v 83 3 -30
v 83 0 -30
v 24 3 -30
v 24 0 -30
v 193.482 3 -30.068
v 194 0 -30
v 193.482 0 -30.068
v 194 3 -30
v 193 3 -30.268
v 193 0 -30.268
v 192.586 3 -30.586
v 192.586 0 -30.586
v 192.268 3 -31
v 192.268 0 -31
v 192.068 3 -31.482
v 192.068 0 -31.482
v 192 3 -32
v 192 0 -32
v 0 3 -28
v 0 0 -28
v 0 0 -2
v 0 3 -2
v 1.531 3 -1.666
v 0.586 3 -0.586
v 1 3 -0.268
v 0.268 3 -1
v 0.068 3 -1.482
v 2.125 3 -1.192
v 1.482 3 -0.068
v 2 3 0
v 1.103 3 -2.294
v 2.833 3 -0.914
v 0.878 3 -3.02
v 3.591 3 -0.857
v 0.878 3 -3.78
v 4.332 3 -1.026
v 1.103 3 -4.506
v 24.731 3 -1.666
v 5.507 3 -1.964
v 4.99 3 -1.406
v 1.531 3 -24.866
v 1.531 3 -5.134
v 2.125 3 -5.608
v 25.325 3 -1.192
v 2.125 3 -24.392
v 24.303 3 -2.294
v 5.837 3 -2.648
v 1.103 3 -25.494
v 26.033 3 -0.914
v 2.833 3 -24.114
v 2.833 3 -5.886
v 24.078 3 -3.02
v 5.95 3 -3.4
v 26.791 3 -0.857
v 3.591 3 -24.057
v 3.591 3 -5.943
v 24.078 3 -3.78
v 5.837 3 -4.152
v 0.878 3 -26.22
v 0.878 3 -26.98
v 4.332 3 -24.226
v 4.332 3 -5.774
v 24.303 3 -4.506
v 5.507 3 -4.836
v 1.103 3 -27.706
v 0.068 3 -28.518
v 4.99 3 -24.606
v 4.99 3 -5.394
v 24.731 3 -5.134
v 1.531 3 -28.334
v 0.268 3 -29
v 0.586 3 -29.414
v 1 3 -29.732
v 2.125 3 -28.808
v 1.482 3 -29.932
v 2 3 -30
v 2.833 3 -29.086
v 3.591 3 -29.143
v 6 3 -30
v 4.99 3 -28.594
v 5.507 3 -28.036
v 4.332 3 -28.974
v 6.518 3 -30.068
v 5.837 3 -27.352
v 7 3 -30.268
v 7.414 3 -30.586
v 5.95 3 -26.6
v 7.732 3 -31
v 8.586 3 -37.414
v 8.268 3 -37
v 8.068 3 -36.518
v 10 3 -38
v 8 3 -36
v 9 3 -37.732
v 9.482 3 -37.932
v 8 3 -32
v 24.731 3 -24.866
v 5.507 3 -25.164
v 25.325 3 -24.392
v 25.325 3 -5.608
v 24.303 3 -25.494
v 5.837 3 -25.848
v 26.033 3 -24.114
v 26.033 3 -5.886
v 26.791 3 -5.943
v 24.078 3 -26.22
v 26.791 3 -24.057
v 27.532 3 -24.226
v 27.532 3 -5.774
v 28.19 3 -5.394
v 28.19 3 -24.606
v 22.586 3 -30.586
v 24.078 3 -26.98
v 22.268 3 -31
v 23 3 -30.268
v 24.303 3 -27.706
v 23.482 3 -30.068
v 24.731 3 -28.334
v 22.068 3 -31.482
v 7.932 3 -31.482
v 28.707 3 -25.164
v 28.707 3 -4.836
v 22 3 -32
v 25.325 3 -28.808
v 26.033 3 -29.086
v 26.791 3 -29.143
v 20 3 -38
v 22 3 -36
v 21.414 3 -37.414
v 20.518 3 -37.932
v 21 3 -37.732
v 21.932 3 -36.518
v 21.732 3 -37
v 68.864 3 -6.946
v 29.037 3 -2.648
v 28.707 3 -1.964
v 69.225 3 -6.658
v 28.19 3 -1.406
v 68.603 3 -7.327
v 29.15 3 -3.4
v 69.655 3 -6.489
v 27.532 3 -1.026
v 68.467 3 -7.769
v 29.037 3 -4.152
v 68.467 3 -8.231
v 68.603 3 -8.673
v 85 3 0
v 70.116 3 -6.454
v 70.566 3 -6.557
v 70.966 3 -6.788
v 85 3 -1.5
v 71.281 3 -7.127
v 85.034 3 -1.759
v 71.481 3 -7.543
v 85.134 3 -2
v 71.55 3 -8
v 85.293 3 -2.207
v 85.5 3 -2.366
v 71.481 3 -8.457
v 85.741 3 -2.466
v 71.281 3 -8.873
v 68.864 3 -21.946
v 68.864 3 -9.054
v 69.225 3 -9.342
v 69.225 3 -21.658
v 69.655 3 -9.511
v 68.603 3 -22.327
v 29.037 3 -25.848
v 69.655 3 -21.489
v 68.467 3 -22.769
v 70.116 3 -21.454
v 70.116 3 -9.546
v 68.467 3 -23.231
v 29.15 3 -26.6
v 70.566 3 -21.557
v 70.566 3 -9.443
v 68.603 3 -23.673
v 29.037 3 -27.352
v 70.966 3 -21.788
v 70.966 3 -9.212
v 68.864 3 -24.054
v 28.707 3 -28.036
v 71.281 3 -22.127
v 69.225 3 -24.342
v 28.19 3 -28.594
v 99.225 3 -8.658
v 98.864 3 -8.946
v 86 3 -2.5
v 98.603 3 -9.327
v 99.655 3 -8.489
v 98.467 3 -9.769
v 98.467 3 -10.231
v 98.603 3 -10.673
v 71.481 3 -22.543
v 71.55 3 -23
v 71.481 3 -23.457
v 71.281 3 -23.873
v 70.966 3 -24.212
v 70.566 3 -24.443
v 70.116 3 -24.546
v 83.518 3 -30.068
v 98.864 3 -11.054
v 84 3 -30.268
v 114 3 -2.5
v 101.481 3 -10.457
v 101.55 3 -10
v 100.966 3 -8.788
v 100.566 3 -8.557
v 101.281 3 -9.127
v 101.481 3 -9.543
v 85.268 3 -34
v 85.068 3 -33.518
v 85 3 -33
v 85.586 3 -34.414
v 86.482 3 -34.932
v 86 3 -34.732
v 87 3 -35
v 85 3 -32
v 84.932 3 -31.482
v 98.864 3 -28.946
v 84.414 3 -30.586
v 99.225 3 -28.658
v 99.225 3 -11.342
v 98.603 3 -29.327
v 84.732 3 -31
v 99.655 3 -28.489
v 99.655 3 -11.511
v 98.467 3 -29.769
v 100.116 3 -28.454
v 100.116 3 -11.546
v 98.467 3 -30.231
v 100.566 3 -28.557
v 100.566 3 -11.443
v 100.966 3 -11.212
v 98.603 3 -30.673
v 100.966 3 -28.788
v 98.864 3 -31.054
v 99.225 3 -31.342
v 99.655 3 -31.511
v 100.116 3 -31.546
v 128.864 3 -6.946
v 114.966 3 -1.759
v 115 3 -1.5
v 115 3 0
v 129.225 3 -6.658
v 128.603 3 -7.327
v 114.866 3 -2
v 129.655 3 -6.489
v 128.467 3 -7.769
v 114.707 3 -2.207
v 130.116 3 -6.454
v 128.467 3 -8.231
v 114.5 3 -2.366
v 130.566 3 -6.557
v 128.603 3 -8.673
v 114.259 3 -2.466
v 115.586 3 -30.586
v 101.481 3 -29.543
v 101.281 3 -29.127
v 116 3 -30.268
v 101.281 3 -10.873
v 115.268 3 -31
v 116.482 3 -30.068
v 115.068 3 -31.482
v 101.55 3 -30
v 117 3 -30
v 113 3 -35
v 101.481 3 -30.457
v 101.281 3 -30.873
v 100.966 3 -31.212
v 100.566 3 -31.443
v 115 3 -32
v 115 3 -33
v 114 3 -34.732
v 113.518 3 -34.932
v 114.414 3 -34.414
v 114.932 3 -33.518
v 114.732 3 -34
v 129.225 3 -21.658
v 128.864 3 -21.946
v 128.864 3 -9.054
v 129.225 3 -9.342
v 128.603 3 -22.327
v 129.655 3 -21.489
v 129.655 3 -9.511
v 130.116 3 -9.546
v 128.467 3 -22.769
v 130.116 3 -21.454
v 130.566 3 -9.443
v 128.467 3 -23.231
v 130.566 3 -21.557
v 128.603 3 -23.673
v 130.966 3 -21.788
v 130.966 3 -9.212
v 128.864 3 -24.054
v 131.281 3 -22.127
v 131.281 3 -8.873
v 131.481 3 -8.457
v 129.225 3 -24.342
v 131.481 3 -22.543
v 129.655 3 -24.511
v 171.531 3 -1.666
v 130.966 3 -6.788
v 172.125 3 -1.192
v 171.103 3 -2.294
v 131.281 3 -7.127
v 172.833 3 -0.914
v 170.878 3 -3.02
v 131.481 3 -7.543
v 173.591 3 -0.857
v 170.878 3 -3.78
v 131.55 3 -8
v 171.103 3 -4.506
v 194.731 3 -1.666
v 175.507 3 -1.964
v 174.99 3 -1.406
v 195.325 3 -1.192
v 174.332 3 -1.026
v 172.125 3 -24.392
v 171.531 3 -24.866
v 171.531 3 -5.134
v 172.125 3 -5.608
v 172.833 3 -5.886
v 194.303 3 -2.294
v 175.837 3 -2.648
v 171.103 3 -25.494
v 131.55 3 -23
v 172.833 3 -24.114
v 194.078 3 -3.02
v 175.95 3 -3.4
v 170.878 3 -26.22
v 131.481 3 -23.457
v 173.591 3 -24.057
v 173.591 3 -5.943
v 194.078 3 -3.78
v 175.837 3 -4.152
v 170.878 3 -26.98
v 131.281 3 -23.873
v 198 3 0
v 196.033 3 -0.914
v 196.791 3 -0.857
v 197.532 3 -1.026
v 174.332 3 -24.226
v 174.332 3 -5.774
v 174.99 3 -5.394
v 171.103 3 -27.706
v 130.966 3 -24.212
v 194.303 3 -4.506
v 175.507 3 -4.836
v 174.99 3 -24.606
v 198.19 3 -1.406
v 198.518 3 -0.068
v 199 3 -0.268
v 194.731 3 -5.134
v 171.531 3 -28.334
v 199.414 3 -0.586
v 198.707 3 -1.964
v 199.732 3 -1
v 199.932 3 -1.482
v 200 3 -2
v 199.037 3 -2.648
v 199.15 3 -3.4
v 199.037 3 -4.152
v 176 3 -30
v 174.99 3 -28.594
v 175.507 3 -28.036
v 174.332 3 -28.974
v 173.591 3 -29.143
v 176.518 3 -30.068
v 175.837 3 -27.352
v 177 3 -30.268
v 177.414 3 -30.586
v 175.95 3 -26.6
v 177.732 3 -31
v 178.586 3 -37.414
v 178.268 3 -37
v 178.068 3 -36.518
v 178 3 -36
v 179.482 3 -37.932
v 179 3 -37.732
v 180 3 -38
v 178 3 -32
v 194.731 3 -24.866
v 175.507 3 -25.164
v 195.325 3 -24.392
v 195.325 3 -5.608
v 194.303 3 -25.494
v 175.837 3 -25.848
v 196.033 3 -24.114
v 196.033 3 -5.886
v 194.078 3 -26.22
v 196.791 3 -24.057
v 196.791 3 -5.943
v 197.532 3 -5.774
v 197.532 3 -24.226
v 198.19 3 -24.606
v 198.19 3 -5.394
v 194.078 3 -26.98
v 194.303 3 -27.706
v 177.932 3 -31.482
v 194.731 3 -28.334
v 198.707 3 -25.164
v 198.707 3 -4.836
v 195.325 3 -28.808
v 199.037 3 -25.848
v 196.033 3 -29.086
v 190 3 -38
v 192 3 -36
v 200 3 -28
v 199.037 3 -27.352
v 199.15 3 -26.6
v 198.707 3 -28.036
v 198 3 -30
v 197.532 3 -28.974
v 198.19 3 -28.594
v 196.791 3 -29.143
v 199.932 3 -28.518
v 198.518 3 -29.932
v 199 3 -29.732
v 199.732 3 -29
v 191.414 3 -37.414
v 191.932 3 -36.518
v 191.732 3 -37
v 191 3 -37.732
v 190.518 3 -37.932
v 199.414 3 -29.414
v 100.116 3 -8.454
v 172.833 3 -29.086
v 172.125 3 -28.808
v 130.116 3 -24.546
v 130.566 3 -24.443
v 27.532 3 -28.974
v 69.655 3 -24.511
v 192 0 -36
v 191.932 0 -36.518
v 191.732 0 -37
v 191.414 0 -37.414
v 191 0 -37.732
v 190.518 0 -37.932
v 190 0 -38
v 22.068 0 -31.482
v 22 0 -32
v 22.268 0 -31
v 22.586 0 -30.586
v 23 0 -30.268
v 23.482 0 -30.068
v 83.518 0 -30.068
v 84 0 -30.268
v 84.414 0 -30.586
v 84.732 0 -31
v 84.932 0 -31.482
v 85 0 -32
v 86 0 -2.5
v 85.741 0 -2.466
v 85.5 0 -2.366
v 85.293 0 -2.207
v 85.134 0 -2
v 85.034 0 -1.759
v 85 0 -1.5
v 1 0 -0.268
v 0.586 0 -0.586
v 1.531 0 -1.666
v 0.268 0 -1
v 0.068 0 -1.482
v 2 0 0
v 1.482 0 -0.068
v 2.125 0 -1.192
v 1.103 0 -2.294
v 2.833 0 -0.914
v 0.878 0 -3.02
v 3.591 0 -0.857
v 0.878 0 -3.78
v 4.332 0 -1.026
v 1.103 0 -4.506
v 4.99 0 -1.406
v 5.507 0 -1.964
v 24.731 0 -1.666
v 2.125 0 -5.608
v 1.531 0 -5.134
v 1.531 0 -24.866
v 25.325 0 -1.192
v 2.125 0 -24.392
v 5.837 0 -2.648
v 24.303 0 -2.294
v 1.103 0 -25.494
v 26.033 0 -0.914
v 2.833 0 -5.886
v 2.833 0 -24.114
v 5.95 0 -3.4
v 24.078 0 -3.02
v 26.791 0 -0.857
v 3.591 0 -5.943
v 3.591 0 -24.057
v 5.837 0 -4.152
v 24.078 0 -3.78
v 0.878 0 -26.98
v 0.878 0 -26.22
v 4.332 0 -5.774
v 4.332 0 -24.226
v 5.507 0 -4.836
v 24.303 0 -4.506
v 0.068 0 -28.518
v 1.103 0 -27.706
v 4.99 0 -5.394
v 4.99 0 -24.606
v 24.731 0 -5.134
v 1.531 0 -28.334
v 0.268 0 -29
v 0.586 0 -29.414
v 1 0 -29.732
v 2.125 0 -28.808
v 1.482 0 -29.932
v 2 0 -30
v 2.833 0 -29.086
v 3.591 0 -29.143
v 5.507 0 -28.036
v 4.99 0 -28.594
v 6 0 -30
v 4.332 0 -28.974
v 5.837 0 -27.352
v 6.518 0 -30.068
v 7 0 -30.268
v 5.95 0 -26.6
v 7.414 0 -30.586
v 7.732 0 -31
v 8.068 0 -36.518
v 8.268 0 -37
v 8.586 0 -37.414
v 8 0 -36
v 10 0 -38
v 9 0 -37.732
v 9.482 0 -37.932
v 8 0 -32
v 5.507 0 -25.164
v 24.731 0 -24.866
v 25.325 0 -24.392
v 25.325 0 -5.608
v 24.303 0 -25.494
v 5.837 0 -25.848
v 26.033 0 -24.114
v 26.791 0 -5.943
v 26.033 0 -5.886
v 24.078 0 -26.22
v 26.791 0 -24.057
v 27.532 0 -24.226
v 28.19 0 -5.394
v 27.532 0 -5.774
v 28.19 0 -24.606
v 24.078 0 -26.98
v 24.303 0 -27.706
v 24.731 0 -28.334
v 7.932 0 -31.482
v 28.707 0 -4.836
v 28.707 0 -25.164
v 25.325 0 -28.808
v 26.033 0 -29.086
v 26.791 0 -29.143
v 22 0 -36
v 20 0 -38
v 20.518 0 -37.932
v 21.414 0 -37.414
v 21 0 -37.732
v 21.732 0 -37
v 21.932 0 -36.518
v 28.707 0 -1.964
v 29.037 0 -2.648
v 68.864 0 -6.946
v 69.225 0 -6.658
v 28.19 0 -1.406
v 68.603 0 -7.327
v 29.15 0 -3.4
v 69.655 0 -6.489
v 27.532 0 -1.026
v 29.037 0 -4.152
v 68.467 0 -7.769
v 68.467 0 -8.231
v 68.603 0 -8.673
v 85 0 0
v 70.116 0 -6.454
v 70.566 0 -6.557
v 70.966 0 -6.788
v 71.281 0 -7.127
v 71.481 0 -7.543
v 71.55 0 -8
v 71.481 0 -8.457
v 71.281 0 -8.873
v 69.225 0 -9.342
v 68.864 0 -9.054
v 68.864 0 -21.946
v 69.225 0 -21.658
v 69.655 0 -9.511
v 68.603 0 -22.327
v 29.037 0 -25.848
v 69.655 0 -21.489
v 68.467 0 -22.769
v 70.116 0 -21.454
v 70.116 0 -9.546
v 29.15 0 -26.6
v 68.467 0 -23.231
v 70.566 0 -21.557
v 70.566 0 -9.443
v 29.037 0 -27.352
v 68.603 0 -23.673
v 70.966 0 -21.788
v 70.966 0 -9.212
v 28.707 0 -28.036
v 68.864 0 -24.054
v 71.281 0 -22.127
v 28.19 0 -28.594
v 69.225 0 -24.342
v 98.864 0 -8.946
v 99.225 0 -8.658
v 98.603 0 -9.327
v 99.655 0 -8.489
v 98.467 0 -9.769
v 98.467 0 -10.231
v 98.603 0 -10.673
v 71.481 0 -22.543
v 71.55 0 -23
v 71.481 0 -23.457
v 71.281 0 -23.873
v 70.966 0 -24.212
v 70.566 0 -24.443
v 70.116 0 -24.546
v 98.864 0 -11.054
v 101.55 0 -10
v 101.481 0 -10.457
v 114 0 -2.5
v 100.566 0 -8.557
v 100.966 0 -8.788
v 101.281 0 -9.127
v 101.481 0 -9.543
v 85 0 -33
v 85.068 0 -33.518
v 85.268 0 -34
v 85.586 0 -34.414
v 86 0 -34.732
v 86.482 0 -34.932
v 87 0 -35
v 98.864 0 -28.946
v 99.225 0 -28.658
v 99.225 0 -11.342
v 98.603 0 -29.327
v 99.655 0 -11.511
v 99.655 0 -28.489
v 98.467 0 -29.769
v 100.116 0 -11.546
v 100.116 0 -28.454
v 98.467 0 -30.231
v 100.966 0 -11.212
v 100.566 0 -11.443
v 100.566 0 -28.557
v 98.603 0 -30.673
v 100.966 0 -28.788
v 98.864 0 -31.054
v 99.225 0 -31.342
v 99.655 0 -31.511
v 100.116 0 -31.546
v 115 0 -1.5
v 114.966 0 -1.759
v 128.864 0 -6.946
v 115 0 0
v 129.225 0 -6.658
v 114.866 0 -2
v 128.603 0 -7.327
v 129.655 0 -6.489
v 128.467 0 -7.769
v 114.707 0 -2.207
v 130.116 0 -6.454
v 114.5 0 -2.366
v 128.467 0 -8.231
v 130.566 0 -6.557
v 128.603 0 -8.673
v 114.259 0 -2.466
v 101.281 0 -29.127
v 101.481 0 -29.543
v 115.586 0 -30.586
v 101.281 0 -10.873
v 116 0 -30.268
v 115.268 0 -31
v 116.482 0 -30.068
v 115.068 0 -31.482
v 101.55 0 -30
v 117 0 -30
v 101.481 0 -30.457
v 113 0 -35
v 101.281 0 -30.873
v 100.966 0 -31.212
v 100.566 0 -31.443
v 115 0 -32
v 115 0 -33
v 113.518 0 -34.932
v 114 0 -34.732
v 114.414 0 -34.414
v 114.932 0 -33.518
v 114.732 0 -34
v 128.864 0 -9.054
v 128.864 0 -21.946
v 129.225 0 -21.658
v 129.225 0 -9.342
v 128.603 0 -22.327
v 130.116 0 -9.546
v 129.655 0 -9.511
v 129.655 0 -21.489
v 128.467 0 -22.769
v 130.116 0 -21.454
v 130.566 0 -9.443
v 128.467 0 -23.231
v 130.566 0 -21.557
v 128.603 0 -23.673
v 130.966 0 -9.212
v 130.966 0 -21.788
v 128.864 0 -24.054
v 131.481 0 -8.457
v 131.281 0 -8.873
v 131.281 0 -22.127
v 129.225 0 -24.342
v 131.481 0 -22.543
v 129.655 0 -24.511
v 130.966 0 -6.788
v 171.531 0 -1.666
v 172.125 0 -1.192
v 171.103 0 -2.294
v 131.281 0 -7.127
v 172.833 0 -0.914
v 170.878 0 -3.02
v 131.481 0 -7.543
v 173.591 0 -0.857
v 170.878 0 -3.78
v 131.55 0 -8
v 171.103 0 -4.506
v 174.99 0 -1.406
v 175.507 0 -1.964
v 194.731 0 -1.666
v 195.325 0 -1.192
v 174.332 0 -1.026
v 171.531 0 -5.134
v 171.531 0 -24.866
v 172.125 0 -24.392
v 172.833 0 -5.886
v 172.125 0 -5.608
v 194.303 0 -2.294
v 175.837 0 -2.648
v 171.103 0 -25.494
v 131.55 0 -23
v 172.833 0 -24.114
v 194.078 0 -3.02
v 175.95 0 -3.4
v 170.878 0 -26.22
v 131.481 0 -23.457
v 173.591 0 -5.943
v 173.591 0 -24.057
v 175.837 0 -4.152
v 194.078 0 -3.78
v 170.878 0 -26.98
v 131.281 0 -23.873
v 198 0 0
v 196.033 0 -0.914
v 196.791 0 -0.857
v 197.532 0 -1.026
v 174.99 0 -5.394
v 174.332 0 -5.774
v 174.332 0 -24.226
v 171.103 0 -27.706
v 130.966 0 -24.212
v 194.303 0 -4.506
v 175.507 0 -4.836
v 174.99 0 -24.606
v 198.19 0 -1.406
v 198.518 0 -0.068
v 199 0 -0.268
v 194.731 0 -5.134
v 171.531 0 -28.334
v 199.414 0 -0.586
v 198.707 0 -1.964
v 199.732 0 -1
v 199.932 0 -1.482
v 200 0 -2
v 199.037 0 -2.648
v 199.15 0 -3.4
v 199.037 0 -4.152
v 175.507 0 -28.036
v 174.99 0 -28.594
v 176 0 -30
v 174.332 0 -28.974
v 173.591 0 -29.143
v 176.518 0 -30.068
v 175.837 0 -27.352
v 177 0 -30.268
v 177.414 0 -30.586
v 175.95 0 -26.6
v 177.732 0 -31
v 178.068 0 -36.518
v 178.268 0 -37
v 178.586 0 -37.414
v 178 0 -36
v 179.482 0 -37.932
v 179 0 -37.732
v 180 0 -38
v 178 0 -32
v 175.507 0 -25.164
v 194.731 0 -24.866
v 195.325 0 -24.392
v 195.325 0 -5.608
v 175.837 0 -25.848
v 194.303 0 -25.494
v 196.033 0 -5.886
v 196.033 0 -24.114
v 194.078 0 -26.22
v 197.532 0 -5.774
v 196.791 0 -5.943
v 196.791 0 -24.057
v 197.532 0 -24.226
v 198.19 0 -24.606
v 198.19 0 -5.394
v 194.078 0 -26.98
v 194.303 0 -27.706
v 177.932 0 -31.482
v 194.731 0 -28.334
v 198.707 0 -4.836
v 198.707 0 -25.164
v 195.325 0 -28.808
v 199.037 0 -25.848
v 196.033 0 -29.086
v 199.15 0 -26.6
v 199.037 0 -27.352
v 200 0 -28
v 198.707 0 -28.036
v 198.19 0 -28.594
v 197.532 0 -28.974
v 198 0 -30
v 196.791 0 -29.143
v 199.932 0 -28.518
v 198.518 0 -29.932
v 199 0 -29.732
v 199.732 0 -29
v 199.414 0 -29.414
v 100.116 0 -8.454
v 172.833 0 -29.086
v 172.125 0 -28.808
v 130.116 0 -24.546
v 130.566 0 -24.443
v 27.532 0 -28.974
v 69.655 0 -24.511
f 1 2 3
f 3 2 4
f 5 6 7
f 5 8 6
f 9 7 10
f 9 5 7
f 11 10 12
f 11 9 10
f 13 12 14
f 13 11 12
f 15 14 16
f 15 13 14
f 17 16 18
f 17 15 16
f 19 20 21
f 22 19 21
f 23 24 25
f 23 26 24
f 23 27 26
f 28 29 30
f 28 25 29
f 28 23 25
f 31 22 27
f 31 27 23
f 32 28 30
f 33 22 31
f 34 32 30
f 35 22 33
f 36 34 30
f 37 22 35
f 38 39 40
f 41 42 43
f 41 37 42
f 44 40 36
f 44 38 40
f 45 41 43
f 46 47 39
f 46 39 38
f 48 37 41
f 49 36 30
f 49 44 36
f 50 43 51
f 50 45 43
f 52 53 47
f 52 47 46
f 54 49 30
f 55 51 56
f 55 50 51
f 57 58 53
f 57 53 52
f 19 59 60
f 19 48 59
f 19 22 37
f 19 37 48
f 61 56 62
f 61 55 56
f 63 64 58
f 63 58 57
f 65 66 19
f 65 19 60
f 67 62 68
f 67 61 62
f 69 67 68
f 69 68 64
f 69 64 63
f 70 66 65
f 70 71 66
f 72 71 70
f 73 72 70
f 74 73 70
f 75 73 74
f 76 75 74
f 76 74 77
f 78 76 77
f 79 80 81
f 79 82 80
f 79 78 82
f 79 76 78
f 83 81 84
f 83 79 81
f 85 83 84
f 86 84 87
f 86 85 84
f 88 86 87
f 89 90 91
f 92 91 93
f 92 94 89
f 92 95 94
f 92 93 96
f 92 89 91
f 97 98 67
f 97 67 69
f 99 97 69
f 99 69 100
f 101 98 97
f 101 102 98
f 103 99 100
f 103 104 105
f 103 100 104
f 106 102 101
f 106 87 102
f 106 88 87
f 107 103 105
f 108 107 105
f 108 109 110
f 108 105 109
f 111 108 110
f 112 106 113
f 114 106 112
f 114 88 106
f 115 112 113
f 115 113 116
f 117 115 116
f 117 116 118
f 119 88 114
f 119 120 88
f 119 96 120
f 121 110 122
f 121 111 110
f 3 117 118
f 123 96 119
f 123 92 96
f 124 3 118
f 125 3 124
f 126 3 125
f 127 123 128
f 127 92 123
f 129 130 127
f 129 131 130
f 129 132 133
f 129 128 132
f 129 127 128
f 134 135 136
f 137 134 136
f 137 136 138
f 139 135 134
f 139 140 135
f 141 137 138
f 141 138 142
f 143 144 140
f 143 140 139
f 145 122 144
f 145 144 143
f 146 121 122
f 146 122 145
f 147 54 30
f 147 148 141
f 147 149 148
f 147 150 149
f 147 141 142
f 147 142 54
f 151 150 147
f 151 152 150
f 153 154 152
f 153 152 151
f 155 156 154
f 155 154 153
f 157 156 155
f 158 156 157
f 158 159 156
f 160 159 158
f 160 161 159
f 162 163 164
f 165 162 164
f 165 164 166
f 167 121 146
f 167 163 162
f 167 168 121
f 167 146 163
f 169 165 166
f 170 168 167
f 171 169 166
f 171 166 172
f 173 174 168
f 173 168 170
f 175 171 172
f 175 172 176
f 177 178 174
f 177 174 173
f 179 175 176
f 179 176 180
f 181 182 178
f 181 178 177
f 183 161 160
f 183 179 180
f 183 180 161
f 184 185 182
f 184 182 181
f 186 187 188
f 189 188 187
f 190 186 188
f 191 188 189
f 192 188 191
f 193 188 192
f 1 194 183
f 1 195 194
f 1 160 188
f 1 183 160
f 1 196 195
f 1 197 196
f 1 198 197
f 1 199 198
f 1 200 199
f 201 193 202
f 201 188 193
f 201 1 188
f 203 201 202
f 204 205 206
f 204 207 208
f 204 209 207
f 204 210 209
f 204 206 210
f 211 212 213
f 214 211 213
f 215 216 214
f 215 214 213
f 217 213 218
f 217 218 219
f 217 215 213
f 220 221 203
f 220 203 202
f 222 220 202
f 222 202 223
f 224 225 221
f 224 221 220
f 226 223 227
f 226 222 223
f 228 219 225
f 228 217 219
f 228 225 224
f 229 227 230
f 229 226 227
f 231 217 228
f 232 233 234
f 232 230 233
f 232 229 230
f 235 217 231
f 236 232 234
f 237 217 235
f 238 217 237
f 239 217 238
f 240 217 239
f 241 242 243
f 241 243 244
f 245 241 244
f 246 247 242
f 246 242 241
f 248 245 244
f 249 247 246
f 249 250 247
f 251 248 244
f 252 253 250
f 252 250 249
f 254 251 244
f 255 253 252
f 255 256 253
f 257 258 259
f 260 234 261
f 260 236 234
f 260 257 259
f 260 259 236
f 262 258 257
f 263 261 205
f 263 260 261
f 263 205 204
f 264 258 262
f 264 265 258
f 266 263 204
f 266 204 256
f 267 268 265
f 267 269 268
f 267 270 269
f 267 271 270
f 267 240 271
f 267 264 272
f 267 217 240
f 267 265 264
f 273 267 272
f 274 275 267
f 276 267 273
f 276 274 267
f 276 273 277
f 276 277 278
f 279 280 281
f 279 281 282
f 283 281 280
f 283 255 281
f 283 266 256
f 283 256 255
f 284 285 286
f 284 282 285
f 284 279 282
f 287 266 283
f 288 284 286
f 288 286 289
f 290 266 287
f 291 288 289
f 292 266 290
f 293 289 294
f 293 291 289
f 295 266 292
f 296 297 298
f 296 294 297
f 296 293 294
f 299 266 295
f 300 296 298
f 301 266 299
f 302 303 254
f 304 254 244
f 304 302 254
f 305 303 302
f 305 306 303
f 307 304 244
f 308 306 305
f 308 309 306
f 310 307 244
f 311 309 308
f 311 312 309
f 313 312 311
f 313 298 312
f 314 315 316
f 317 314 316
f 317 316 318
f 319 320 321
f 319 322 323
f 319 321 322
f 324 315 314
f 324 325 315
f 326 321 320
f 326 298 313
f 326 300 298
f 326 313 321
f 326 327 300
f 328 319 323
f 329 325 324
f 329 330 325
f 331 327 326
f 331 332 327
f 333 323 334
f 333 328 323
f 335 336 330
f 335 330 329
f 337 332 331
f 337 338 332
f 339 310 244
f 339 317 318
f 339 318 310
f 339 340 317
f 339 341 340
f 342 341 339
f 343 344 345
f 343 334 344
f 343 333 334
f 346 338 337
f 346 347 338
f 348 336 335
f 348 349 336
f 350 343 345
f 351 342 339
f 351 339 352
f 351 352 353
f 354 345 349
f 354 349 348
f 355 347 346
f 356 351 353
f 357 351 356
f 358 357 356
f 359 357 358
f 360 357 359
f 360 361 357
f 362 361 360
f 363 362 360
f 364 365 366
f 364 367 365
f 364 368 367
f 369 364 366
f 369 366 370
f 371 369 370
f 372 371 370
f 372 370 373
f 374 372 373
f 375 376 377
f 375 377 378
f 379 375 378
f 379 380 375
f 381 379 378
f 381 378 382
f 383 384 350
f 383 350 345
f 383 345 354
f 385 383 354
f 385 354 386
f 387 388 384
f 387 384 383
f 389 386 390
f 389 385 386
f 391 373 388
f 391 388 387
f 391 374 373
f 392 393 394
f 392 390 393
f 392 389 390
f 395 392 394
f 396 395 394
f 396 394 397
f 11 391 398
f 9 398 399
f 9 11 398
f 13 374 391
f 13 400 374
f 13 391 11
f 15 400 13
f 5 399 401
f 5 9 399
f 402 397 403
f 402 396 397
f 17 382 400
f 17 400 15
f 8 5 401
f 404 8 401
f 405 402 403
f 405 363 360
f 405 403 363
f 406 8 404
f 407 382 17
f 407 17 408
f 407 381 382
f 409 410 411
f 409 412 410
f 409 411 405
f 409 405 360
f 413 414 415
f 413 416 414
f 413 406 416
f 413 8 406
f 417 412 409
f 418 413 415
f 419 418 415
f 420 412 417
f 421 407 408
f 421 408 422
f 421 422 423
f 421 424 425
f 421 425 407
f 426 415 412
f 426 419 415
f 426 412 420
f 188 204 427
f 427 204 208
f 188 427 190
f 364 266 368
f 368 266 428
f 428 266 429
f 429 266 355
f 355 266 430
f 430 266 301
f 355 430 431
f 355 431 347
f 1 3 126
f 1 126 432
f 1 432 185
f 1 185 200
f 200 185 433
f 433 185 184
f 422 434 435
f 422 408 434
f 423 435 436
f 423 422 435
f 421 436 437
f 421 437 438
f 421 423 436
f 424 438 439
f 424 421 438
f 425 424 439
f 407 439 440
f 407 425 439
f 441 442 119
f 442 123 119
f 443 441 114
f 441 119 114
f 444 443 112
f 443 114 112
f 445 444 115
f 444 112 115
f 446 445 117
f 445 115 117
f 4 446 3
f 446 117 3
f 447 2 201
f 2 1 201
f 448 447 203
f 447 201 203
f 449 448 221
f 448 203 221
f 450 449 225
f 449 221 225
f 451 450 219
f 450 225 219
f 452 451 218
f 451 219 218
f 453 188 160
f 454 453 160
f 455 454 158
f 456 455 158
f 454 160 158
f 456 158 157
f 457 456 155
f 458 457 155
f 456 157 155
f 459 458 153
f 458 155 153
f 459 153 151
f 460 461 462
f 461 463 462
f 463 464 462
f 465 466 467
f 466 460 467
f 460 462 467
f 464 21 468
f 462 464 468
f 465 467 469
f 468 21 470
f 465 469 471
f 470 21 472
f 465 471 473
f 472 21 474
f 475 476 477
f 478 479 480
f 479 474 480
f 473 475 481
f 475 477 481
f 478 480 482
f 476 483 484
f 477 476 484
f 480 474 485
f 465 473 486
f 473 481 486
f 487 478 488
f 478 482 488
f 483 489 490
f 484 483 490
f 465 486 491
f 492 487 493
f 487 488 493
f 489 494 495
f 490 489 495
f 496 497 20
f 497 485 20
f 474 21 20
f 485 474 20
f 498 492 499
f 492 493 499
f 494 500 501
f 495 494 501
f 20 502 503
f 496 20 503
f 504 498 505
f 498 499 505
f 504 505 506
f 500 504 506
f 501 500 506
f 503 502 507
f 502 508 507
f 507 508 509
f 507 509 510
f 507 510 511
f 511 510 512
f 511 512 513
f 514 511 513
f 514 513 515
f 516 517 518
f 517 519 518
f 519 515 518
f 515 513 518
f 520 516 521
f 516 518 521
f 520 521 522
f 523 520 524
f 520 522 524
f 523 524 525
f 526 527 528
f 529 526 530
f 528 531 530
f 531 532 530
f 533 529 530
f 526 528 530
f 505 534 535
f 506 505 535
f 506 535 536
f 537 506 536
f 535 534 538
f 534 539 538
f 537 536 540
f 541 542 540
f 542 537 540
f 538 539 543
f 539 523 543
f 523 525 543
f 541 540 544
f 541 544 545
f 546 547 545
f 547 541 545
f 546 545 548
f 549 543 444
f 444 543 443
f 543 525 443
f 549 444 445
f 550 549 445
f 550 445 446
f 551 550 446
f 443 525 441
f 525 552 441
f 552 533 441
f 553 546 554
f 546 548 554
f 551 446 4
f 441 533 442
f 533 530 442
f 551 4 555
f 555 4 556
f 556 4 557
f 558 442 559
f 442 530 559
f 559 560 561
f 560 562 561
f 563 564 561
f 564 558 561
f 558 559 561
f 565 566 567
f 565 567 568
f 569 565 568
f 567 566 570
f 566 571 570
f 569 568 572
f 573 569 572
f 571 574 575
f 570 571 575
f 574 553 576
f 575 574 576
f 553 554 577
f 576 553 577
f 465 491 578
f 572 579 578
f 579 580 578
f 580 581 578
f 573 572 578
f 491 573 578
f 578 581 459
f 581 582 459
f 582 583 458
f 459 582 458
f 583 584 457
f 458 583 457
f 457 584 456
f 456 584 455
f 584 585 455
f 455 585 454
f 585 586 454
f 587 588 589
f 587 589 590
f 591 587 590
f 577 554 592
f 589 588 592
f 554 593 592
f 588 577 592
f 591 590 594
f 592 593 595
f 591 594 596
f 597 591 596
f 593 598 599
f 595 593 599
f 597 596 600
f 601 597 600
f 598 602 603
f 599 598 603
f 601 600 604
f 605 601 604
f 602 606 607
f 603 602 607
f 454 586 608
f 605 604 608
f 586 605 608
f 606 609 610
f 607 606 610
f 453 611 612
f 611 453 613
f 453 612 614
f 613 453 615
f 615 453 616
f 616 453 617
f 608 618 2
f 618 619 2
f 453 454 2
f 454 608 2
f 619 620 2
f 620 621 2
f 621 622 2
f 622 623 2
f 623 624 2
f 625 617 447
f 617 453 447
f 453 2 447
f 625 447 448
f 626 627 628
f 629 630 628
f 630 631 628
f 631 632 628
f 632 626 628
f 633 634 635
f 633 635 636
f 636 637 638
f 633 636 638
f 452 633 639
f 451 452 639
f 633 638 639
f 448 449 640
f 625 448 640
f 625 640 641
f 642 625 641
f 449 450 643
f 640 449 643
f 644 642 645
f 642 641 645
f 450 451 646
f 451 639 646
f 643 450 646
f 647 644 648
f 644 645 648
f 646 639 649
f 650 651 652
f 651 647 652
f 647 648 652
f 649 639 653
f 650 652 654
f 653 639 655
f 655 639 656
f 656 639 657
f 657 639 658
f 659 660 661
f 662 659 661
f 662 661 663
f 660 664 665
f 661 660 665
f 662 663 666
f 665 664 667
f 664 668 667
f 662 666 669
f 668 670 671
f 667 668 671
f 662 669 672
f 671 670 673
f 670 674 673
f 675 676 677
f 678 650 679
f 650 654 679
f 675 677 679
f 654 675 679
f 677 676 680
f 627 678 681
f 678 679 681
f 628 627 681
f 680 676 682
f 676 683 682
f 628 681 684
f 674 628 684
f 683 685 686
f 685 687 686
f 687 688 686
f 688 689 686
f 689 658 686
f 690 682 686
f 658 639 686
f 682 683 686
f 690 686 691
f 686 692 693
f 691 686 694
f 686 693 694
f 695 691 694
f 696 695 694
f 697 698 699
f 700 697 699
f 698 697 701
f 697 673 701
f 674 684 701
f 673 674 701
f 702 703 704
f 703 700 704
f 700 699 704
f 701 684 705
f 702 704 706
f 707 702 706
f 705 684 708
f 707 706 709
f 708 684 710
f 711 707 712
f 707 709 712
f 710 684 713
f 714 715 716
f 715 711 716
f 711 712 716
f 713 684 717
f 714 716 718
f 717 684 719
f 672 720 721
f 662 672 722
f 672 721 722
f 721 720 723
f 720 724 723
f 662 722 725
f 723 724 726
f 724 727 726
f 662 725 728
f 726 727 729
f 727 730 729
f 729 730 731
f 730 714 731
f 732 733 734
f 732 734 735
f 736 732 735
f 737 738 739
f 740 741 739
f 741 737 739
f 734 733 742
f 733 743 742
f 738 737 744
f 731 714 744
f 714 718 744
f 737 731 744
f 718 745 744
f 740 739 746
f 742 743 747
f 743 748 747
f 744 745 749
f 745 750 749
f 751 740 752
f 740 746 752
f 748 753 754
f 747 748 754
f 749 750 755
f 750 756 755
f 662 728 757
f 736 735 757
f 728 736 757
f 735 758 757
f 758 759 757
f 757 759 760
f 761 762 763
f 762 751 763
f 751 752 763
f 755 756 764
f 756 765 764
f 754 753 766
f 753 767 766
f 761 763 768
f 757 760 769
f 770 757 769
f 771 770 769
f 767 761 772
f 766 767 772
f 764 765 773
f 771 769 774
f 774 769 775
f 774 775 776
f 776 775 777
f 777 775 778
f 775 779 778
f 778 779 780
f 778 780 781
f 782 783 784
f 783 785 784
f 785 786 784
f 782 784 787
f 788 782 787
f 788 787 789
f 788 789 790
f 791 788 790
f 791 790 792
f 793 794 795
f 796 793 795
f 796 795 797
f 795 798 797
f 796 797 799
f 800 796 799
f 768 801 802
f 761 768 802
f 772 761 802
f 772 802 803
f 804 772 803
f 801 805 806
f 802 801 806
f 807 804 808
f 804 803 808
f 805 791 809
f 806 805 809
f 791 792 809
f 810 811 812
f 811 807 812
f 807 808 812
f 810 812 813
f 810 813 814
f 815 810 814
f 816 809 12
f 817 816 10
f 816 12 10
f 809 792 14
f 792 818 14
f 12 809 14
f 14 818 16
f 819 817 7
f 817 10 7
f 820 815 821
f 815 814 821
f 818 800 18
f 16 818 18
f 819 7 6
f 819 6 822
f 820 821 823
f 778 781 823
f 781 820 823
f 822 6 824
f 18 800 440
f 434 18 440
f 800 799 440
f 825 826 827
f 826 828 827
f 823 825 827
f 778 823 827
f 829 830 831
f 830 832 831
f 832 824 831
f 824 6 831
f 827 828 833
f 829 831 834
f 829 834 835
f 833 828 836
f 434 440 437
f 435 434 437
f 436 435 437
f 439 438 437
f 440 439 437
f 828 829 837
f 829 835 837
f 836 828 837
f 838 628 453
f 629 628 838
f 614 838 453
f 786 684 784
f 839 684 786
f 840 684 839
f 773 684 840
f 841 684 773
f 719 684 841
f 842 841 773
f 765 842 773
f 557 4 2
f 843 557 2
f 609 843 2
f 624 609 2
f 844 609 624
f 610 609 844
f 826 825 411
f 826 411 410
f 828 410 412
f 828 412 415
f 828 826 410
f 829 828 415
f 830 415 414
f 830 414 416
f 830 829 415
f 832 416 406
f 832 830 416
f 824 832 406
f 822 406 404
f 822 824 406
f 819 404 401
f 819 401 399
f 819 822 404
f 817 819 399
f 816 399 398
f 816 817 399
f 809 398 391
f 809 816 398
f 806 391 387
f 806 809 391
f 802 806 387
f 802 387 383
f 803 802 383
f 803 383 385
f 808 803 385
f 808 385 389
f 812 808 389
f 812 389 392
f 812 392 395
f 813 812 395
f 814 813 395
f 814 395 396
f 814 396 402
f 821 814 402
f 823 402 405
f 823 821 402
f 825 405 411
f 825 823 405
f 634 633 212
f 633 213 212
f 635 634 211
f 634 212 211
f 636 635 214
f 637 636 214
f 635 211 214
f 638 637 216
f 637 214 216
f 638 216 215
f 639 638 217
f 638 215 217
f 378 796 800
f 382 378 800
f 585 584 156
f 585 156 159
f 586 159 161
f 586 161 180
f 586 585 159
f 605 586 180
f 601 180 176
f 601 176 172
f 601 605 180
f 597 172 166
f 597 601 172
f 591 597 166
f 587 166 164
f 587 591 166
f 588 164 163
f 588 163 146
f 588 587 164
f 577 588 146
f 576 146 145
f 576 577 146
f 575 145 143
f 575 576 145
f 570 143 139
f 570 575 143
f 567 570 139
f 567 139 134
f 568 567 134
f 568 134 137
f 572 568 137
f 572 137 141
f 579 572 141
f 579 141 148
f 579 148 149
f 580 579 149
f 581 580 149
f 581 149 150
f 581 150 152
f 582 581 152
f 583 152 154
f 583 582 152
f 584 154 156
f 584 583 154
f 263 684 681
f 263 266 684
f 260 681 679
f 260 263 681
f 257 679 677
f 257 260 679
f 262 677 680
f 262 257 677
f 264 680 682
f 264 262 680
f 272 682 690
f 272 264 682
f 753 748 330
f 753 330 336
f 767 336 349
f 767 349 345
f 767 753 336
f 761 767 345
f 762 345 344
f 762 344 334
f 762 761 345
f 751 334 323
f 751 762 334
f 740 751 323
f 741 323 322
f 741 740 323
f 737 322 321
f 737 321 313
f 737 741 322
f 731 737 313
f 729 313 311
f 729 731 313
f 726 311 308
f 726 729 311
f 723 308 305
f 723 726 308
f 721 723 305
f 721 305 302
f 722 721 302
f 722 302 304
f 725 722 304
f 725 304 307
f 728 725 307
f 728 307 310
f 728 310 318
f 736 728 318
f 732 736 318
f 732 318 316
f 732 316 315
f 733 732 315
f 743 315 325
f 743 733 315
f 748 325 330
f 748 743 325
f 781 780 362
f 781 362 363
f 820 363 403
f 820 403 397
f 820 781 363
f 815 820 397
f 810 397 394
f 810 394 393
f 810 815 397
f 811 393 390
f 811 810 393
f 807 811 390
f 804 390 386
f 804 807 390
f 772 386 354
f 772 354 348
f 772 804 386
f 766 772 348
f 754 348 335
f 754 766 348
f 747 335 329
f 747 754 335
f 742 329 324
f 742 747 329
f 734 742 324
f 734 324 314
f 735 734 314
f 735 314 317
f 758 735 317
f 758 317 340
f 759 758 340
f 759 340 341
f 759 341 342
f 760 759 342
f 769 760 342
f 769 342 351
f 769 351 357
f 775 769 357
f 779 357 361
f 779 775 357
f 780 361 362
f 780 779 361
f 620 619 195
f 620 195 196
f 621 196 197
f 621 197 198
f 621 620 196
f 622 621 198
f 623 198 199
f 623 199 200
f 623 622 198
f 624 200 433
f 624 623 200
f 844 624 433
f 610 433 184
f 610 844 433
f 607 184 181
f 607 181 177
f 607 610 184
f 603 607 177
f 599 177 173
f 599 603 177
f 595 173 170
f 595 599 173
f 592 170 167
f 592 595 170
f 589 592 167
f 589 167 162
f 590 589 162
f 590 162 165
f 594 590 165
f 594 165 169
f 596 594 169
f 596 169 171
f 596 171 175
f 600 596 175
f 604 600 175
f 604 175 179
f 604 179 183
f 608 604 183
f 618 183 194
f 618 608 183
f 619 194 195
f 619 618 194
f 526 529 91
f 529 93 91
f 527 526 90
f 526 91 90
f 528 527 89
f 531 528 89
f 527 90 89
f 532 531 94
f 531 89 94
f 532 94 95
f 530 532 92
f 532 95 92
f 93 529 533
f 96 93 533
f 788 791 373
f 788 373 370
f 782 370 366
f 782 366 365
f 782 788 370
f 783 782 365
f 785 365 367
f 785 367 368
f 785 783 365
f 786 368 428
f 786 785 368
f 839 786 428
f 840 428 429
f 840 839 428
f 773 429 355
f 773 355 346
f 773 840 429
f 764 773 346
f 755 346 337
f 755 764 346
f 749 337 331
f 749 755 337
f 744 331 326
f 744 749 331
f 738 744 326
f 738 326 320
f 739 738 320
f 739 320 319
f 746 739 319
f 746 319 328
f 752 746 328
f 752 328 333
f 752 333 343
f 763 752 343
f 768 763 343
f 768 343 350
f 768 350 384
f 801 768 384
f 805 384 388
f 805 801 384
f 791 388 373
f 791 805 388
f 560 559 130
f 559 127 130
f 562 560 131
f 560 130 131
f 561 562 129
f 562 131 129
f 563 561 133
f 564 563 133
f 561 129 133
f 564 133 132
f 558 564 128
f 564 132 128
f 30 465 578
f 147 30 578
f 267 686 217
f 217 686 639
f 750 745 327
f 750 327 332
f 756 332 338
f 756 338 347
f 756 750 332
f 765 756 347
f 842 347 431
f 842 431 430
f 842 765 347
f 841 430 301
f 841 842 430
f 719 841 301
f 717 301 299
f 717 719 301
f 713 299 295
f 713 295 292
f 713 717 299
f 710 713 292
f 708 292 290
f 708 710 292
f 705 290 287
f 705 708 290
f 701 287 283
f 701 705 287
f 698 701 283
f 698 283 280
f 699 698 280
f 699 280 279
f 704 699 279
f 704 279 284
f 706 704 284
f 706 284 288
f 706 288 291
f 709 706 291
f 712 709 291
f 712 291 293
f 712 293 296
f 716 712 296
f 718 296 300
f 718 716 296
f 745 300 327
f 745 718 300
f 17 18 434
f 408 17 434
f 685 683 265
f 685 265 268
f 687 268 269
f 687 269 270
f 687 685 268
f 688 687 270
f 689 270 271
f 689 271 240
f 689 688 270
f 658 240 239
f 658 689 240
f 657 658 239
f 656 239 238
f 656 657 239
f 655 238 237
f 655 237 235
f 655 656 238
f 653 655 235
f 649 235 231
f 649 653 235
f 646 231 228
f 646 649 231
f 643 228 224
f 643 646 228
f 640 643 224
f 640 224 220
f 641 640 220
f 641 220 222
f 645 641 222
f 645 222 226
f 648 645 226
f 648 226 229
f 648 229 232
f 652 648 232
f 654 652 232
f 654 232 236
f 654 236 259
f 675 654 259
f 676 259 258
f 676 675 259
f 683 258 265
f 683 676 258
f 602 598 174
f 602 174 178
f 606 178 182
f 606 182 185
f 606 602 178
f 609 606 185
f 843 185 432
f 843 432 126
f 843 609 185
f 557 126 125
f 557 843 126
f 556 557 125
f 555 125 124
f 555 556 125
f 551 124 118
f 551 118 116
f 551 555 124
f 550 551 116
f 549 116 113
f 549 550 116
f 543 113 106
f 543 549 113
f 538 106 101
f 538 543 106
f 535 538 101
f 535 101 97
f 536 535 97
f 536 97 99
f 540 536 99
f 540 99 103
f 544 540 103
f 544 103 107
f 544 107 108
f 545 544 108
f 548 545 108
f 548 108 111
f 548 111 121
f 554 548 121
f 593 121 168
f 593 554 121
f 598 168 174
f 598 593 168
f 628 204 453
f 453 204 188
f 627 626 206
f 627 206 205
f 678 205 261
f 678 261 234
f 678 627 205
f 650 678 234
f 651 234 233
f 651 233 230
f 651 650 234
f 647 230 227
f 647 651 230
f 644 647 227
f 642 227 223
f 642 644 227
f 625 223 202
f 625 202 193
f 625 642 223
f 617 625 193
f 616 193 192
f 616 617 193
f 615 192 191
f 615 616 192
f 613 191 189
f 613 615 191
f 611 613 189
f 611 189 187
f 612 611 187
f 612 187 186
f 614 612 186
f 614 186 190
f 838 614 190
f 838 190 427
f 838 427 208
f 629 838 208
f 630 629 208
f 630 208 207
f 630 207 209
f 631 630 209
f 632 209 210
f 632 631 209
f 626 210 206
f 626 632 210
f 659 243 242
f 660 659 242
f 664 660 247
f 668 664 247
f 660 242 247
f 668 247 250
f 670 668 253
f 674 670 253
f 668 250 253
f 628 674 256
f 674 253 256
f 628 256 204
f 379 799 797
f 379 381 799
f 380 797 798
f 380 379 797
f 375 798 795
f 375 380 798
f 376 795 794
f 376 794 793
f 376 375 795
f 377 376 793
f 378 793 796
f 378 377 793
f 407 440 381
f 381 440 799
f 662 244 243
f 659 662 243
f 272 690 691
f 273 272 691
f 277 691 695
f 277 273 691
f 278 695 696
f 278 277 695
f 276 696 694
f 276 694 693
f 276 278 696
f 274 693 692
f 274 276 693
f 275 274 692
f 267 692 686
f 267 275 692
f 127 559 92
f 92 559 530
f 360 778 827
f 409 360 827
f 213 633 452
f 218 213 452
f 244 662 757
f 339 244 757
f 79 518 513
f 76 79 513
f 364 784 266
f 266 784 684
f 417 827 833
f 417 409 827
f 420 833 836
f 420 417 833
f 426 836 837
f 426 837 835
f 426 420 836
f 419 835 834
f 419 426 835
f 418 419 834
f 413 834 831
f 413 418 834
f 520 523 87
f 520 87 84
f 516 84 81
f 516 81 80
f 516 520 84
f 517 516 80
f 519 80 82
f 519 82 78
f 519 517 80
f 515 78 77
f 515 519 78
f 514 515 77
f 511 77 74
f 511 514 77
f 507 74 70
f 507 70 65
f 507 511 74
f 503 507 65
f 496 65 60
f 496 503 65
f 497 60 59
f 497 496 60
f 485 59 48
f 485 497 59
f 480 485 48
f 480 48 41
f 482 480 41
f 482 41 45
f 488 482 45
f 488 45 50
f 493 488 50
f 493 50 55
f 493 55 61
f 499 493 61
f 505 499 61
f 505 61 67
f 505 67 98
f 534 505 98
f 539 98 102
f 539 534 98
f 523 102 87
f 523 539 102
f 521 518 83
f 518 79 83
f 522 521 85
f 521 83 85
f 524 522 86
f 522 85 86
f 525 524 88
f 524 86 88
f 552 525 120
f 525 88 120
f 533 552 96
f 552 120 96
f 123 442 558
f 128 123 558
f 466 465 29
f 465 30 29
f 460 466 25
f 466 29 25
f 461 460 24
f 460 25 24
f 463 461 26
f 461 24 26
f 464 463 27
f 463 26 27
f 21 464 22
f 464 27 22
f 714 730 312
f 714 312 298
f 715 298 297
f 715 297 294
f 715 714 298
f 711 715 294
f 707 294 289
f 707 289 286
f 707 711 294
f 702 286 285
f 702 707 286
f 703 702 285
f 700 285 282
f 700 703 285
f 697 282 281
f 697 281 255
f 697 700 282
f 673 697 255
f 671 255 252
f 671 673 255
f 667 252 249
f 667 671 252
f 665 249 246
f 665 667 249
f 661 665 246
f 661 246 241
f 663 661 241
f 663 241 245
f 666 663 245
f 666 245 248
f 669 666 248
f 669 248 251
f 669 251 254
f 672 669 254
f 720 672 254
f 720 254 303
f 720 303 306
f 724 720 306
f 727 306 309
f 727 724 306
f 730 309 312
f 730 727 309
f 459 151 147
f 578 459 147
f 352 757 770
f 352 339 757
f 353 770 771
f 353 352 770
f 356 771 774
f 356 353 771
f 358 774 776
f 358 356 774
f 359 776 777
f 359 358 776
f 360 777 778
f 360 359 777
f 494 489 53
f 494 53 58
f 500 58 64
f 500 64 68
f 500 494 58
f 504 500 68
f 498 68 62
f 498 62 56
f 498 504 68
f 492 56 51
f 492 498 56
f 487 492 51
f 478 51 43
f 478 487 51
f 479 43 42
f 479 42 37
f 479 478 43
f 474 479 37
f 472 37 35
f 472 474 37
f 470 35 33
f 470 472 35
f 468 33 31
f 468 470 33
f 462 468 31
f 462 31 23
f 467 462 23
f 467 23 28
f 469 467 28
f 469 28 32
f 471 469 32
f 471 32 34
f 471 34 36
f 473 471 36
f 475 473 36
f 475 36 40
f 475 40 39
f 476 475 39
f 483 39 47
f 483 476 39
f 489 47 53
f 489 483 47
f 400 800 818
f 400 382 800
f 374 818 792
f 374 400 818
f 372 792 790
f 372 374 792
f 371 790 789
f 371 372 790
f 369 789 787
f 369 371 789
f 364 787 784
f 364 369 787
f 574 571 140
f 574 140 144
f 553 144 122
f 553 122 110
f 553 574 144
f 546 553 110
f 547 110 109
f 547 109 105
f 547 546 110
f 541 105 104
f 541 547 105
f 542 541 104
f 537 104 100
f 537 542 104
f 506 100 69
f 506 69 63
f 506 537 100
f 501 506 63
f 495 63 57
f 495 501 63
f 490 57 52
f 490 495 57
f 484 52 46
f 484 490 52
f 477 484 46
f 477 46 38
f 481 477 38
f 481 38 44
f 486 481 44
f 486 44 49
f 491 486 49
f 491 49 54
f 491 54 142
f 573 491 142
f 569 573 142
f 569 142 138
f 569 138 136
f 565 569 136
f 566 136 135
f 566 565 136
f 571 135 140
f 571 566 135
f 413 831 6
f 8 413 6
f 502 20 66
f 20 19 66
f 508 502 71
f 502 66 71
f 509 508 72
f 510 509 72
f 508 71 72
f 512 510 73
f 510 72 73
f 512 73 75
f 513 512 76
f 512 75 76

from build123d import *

# Parameters (mm, degrees)
CROQUIS1_R              = 2.55
CROQUIS1_R_2            = 1.55
SALIENTE_EXTRUIR1_DEPTH = 3
REDONDEO2_R             = 2
CORTAR_EXTRUIR1_DEPTH   = 3


with BuildPart() as part:
    # Croquis1 → Saliente-Extruir1 (new body)
    with BuildSketch(Plane(origin=(0, 0, 0), x_dir=(1, 0, 0), z_dir=(0, 1, 0))):
        Polygon((0, 0), (200, 0), (200, 30), (192, 30), (192, 38), (178, 38), (178, 30), (115, 30), (115, 35), (85, 35), (85, 30), (22, 30), (22, 38), (8, 38), (8, 30), (0, 30), align=None)
        with Locations((3.4, 26.6)):
            Circle(CROQUIS1_R, mode=Mode.SUBTRACT)
        with Locations((26.6, 26.6)):
            Circle(CROQUIS1_R, mode=Mode.SUBTRACT)
        with Locations((26.6, 3.4)):
            Circle(CROQUIS1_R, mode=Mode.SUBTRACT)
        with Locations((3.4, 3.4)):
            Circle(CROQUIS1_R, mode=Mode.SUBTRACT)
        with Locations((173.4, 3.4)):
            Circle(CROQUIS1_R, mode=Mode.SUBTRACT)
        with Locations((196.6, 3.4)):
            Circle(CROQUIS1_R, mode=Mode.SUBTRACT)
        with Locations((196.6, 26.6)):
            Circle(CROQUIS1_R, mode=Mode.SUBTRACT)
        with Locations((173.4, 26.6)):
            Circle(CROQUIS1_R, mode=Mode.SUBTRACT)
        with Locations((100, 30)):
            Circle(CROQUIS1_R_2, mode=Mode.SUBTRACT)
        with Locations((100, 10)):
            Circle(CROQUIS1_R_2, mode=Mode.SUBTRACT)
        with Locations((70, 23)):
            Circle(CROQUIS1_R_2, mode=Mode.SUBTRACT)
        with Locations((70, 8)):
            Circle(CROQUIS1_R_2, mode=Mode.SUBTRACT)
        with Locations((130, 8)):
            Circle(CROQUIS1_R_2, mode=Mode.SUBTRACT)
        with Locations((130, 23)):
            Circle(CROQUIS1_R_2, mode=Mode.SUBTRACT)
    extrude(amount=SALIENTE_EXTRUIR1_DEPTH)

    # Redondeo2
    redondeo2_edges = [part.edges().sort_by_distance(p)[0] for p in [
        (0, 1.5, -30),
        (8, 1.5, -30),
        (8, 1.5, -38),
        (22, 1.5, -38),
        (22, 1.5, -30),
        (85, 1.5, -30),
        (85, 1.5, -35),
        (115, 1.5, -35),
        (115, 1.5, -30),
        (178, 1.5, -30),
        (178, 1.5, -38),
        (192, 1.5, -38),
        (192, 1.5, -30),
        (200, 1.5, -30),
        (200, 1.5, 0),
        (0, 1.5, 0),
    ]]
    fillet(redondeo2_edges, radius=REDONDEO2_R)

    # Croquis2 → Cortar-Extruir1 (cut)
    with BuildSketch(Plane(origin=(0, 3, 0), x_dir=(1, 0, 0), z_dir=(0, 1, 0))):
        with BuildLine():
            Line((85, 0), (115, 0))
            Line((115, 0), (115, 1.5))
            ThreePointArc((115, 1.5), (114.707106781, 2.207106781), (114, 2.5))
            Line((114, 2.5), (86, 2.5))
            ThreePointArc((86, 2.5), (85.292893219, 2.207106781), (85, 1.5))
            Line((85, 1.5), (85, 0))
        make_face()
    extrude(amount=-CORTAR_EXTRUIR1_DEPTH, mode=Mode.SUBTRACT)


solid = part.part
